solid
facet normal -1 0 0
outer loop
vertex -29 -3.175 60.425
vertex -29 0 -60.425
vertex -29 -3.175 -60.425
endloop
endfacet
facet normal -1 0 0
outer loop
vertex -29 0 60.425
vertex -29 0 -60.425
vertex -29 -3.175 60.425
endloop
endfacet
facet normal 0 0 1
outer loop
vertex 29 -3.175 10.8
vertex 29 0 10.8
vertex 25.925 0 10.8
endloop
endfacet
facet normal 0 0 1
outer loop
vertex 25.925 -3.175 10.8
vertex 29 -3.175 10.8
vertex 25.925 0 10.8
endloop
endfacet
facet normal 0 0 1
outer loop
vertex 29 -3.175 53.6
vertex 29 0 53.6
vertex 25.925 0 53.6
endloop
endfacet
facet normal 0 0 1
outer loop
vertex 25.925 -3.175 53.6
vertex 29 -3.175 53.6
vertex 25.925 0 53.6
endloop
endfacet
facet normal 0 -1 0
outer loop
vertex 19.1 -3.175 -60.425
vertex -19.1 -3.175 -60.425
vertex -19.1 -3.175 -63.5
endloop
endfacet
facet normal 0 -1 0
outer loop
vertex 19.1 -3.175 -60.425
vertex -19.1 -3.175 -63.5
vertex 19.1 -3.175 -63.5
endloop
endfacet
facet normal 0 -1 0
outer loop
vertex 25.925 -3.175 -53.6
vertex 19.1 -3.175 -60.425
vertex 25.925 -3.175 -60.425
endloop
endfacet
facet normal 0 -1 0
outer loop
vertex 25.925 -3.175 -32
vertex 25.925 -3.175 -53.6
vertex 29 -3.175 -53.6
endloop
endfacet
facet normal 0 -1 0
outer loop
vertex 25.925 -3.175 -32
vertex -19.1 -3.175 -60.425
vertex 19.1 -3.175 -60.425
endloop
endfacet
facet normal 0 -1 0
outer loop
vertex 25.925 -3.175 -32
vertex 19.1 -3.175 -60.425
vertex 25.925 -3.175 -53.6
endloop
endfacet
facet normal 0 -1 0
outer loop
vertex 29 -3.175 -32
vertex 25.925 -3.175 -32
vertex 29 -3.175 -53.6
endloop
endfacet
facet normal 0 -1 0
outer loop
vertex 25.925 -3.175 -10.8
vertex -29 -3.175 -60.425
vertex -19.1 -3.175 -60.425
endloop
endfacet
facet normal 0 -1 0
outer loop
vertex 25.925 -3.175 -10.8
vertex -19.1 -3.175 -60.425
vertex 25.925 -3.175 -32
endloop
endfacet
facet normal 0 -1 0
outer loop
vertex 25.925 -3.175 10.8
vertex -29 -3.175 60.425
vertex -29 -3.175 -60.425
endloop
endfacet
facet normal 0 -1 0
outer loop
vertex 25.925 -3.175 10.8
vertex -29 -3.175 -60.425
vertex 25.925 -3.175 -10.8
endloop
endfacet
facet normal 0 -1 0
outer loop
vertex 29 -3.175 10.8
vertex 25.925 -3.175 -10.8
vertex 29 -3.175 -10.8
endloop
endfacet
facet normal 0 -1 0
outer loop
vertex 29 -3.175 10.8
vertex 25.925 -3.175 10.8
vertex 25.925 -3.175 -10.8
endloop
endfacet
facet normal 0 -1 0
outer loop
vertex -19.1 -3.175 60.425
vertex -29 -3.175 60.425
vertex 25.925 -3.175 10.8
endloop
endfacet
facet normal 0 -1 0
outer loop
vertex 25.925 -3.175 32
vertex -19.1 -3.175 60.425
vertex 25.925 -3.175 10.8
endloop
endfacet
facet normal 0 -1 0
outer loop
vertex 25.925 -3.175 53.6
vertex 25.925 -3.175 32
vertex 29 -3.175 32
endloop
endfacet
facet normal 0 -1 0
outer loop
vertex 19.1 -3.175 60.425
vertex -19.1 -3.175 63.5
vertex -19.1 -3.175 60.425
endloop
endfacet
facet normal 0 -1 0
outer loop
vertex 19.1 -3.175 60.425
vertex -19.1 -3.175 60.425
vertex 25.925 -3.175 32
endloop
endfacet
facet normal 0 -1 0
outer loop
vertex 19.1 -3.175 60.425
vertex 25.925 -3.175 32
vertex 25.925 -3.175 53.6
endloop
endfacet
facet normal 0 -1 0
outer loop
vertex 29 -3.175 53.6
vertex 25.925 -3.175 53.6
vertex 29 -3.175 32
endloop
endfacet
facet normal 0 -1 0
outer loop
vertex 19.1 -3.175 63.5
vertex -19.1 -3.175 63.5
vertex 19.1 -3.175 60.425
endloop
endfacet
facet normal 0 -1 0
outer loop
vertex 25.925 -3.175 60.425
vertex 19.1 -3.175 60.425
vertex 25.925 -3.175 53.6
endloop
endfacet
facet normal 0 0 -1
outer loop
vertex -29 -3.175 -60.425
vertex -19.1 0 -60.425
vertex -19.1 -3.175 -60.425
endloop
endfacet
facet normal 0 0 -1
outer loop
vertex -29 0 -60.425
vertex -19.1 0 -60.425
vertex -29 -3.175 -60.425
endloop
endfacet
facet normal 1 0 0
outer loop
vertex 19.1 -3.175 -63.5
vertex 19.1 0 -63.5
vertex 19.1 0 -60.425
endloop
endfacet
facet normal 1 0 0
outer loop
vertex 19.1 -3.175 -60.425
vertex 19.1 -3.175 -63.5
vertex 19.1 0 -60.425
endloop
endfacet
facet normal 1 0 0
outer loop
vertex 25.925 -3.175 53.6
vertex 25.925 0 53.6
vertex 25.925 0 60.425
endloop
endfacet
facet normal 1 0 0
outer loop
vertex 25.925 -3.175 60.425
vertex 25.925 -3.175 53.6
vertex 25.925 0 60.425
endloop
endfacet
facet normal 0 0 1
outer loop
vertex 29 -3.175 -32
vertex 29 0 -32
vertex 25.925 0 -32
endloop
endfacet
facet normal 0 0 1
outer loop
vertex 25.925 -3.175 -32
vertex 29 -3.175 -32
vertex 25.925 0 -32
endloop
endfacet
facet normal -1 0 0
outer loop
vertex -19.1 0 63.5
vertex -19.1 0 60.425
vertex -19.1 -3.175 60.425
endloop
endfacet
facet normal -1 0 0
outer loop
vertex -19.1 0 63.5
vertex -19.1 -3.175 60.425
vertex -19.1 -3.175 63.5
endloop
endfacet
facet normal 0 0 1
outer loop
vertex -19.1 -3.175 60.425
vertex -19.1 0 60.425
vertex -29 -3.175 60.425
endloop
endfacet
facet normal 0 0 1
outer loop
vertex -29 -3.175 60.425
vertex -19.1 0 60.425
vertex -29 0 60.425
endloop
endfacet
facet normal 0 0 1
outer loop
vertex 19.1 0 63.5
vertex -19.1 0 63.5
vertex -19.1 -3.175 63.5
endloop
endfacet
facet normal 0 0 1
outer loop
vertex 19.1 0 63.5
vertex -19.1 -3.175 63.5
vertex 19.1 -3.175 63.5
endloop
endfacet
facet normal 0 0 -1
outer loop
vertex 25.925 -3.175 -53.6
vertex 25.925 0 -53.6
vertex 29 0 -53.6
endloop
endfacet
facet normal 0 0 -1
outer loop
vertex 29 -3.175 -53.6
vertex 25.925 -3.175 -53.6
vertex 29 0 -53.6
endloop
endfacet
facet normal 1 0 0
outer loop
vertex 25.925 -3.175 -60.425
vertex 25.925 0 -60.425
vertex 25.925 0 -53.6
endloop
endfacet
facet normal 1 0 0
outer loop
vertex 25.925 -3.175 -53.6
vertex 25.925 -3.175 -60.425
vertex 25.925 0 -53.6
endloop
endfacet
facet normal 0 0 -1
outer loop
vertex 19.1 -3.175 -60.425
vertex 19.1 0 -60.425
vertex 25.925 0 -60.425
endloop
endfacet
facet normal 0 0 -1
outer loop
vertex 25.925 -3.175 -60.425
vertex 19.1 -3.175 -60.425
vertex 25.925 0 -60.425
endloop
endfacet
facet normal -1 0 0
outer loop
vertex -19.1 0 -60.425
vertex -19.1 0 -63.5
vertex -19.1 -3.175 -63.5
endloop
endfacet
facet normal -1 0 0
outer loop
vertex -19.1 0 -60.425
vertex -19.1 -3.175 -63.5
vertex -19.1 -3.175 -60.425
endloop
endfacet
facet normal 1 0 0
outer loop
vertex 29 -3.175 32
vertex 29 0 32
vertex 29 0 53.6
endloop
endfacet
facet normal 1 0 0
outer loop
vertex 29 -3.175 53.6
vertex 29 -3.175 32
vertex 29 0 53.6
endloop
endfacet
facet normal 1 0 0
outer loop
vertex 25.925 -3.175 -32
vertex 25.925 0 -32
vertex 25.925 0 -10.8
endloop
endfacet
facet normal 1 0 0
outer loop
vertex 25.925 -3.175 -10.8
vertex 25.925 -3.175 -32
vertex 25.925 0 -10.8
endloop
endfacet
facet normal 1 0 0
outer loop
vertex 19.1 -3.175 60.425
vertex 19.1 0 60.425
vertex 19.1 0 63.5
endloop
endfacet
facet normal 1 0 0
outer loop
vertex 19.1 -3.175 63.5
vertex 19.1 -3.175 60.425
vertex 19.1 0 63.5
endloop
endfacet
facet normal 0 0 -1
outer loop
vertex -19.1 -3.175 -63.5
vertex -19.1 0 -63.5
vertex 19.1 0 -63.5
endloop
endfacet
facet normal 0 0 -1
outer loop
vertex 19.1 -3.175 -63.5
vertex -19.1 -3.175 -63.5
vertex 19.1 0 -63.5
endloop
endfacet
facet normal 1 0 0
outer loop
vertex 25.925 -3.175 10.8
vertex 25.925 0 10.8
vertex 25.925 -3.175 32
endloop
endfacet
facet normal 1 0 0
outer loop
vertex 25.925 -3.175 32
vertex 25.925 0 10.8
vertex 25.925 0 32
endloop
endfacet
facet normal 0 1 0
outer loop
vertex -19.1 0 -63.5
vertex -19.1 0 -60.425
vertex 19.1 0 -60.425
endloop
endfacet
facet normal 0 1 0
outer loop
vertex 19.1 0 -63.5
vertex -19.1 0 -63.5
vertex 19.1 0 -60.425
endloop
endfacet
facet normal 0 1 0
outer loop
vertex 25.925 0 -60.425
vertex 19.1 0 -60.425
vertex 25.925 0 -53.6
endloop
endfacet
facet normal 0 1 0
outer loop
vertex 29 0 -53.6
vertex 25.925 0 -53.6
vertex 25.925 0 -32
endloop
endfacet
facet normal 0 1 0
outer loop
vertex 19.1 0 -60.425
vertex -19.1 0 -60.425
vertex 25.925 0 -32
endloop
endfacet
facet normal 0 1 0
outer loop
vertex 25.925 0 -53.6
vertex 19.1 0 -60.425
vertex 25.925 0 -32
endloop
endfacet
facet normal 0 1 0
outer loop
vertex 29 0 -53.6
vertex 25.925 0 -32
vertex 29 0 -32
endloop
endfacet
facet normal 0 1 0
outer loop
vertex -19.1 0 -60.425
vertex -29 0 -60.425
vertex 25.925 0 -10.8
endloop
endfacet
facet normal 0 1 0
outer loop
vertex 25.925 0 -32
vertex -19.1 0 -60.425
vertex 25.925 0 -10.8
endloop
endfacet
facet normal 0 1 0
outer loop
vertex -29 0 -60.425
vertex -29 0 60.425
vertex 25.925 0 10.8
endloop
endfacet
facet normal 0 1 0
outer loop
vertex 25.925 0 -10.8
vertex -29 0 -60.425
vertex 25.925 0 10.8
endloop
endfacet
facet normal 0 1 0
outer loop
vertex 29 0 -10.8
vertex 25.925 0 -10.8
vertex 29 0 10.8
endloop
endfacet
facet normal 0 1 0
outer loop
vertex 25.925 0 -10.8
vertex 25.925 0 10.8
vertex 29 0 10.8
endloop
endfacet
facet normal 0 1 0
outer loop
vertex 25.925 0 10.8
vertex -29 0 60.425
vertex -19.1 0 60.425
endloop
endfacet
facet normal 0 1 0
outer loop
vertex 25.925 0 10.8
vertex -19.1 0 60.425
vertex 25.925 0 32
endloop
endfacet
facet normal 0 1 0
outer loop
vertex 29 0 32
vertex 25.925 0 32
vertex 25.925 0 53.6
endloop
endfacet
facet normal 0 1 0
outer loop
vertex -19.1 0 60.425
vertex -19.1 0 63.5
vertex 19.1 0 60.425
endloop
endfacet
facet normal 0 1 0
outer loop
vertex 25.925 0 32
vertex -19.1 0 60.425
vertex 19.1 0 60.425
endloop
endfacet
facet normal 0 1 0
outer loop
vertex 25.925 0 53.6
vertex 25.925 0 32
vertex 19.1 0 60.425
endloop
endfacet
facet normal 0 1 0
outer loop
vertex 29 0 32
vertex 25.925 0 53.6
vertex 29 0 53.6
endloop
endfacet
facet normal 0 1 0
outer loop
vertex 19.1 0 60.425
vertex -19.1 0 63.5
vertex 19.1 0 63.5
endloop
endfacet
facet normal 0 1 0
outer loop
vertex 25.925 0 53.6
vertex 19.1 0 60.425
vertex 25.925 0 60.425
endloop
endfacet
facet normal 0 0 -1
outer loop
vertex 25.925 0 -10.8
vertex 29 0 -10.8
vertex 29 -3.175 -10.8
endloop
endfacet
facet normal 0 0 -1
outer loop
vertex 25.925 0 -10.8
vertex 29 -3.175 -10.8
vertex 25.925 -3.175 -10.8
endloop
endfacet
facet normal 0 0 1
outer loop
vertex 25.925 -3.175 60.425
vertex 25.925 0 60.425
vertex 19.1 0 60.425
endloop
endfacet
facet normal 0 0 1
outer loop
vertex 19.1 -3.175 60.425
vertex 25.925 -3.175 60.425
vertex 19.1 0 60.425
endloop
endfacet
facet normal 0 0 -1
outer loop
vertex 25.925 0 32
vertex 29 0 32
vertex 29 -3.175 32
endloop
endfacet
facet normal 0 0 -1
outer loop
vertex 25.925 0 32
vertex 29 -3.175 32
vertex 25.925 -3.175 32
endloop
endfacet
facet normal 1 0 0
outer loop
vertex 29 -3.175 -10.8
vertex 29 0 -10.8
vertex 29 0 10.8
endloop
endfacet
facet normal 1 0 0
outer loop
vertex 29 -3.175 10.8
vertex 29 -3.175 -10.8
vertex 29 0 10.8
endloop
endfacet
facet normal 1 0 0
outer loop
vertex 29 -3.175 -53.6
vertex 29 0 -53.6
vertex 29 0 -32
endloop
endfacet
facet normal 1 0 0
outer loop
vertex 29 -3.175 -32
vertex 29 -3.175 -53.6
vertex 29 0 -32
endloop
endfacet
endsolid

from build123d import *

# Parameters (mm, degrees)
F0_W     = 58
F0_H     = 127
F1_DEPTH = 3.175
F2_W     = 3.075
F2_H     = 21.2
F2_W_2   = 9.9
F2_H_2   = 3.075
F3_DEPTH = 25


# Not quite as in the source:
# - a length typed as a fraction of an inch, garbled in the dataset ("3 / 203.2 mm" for 3/8 in), is restored


with BuildPart() as f1:
    # F0 (on Front) → F1 (new body)
    with BuildSketch(Plane.XZ):
        Rectangle(F0_W, F0_H)
    extrude(amount=F1_DEPTH)

    # F2 (on face) → F3 (cut)
    with BuildSketch(Plane(origin=(0, 0, 0), x_dir=(-1, 0, 0), z_dir=(0, 1, 0))):
        Polygon((-19.1, 63.5), (-29, 63.5), (-29, 53.6), (-25.925, 53.6), (-25.925, 60.425), (-19.1, 60.425), align=None)
        with Locations((-27.4625, 21.4)):
            Rectangle(F2_W, F2_H)
        with Locations((-27.4625, -21.4)):
            Rectangle(F2_W, F2_H)
        Polygon((-25.925, -53.6), (-29, -53.6), (-29, -63.5), (-19.1, -63.5), (-19.1, -60.425), (-25.925, -60.425), align=None)
        with Locations((24.05, 61.9625)):
            Rectangle(F2_W_2, F2_H_2)
        with Locations((24.05, -61.9625)):
            Rectangle(F2_W_2, F2_H_2)
    extrude(amount=-F3_DEPTH, mode=Mode.SUBTRACT)


solid = f1.part
